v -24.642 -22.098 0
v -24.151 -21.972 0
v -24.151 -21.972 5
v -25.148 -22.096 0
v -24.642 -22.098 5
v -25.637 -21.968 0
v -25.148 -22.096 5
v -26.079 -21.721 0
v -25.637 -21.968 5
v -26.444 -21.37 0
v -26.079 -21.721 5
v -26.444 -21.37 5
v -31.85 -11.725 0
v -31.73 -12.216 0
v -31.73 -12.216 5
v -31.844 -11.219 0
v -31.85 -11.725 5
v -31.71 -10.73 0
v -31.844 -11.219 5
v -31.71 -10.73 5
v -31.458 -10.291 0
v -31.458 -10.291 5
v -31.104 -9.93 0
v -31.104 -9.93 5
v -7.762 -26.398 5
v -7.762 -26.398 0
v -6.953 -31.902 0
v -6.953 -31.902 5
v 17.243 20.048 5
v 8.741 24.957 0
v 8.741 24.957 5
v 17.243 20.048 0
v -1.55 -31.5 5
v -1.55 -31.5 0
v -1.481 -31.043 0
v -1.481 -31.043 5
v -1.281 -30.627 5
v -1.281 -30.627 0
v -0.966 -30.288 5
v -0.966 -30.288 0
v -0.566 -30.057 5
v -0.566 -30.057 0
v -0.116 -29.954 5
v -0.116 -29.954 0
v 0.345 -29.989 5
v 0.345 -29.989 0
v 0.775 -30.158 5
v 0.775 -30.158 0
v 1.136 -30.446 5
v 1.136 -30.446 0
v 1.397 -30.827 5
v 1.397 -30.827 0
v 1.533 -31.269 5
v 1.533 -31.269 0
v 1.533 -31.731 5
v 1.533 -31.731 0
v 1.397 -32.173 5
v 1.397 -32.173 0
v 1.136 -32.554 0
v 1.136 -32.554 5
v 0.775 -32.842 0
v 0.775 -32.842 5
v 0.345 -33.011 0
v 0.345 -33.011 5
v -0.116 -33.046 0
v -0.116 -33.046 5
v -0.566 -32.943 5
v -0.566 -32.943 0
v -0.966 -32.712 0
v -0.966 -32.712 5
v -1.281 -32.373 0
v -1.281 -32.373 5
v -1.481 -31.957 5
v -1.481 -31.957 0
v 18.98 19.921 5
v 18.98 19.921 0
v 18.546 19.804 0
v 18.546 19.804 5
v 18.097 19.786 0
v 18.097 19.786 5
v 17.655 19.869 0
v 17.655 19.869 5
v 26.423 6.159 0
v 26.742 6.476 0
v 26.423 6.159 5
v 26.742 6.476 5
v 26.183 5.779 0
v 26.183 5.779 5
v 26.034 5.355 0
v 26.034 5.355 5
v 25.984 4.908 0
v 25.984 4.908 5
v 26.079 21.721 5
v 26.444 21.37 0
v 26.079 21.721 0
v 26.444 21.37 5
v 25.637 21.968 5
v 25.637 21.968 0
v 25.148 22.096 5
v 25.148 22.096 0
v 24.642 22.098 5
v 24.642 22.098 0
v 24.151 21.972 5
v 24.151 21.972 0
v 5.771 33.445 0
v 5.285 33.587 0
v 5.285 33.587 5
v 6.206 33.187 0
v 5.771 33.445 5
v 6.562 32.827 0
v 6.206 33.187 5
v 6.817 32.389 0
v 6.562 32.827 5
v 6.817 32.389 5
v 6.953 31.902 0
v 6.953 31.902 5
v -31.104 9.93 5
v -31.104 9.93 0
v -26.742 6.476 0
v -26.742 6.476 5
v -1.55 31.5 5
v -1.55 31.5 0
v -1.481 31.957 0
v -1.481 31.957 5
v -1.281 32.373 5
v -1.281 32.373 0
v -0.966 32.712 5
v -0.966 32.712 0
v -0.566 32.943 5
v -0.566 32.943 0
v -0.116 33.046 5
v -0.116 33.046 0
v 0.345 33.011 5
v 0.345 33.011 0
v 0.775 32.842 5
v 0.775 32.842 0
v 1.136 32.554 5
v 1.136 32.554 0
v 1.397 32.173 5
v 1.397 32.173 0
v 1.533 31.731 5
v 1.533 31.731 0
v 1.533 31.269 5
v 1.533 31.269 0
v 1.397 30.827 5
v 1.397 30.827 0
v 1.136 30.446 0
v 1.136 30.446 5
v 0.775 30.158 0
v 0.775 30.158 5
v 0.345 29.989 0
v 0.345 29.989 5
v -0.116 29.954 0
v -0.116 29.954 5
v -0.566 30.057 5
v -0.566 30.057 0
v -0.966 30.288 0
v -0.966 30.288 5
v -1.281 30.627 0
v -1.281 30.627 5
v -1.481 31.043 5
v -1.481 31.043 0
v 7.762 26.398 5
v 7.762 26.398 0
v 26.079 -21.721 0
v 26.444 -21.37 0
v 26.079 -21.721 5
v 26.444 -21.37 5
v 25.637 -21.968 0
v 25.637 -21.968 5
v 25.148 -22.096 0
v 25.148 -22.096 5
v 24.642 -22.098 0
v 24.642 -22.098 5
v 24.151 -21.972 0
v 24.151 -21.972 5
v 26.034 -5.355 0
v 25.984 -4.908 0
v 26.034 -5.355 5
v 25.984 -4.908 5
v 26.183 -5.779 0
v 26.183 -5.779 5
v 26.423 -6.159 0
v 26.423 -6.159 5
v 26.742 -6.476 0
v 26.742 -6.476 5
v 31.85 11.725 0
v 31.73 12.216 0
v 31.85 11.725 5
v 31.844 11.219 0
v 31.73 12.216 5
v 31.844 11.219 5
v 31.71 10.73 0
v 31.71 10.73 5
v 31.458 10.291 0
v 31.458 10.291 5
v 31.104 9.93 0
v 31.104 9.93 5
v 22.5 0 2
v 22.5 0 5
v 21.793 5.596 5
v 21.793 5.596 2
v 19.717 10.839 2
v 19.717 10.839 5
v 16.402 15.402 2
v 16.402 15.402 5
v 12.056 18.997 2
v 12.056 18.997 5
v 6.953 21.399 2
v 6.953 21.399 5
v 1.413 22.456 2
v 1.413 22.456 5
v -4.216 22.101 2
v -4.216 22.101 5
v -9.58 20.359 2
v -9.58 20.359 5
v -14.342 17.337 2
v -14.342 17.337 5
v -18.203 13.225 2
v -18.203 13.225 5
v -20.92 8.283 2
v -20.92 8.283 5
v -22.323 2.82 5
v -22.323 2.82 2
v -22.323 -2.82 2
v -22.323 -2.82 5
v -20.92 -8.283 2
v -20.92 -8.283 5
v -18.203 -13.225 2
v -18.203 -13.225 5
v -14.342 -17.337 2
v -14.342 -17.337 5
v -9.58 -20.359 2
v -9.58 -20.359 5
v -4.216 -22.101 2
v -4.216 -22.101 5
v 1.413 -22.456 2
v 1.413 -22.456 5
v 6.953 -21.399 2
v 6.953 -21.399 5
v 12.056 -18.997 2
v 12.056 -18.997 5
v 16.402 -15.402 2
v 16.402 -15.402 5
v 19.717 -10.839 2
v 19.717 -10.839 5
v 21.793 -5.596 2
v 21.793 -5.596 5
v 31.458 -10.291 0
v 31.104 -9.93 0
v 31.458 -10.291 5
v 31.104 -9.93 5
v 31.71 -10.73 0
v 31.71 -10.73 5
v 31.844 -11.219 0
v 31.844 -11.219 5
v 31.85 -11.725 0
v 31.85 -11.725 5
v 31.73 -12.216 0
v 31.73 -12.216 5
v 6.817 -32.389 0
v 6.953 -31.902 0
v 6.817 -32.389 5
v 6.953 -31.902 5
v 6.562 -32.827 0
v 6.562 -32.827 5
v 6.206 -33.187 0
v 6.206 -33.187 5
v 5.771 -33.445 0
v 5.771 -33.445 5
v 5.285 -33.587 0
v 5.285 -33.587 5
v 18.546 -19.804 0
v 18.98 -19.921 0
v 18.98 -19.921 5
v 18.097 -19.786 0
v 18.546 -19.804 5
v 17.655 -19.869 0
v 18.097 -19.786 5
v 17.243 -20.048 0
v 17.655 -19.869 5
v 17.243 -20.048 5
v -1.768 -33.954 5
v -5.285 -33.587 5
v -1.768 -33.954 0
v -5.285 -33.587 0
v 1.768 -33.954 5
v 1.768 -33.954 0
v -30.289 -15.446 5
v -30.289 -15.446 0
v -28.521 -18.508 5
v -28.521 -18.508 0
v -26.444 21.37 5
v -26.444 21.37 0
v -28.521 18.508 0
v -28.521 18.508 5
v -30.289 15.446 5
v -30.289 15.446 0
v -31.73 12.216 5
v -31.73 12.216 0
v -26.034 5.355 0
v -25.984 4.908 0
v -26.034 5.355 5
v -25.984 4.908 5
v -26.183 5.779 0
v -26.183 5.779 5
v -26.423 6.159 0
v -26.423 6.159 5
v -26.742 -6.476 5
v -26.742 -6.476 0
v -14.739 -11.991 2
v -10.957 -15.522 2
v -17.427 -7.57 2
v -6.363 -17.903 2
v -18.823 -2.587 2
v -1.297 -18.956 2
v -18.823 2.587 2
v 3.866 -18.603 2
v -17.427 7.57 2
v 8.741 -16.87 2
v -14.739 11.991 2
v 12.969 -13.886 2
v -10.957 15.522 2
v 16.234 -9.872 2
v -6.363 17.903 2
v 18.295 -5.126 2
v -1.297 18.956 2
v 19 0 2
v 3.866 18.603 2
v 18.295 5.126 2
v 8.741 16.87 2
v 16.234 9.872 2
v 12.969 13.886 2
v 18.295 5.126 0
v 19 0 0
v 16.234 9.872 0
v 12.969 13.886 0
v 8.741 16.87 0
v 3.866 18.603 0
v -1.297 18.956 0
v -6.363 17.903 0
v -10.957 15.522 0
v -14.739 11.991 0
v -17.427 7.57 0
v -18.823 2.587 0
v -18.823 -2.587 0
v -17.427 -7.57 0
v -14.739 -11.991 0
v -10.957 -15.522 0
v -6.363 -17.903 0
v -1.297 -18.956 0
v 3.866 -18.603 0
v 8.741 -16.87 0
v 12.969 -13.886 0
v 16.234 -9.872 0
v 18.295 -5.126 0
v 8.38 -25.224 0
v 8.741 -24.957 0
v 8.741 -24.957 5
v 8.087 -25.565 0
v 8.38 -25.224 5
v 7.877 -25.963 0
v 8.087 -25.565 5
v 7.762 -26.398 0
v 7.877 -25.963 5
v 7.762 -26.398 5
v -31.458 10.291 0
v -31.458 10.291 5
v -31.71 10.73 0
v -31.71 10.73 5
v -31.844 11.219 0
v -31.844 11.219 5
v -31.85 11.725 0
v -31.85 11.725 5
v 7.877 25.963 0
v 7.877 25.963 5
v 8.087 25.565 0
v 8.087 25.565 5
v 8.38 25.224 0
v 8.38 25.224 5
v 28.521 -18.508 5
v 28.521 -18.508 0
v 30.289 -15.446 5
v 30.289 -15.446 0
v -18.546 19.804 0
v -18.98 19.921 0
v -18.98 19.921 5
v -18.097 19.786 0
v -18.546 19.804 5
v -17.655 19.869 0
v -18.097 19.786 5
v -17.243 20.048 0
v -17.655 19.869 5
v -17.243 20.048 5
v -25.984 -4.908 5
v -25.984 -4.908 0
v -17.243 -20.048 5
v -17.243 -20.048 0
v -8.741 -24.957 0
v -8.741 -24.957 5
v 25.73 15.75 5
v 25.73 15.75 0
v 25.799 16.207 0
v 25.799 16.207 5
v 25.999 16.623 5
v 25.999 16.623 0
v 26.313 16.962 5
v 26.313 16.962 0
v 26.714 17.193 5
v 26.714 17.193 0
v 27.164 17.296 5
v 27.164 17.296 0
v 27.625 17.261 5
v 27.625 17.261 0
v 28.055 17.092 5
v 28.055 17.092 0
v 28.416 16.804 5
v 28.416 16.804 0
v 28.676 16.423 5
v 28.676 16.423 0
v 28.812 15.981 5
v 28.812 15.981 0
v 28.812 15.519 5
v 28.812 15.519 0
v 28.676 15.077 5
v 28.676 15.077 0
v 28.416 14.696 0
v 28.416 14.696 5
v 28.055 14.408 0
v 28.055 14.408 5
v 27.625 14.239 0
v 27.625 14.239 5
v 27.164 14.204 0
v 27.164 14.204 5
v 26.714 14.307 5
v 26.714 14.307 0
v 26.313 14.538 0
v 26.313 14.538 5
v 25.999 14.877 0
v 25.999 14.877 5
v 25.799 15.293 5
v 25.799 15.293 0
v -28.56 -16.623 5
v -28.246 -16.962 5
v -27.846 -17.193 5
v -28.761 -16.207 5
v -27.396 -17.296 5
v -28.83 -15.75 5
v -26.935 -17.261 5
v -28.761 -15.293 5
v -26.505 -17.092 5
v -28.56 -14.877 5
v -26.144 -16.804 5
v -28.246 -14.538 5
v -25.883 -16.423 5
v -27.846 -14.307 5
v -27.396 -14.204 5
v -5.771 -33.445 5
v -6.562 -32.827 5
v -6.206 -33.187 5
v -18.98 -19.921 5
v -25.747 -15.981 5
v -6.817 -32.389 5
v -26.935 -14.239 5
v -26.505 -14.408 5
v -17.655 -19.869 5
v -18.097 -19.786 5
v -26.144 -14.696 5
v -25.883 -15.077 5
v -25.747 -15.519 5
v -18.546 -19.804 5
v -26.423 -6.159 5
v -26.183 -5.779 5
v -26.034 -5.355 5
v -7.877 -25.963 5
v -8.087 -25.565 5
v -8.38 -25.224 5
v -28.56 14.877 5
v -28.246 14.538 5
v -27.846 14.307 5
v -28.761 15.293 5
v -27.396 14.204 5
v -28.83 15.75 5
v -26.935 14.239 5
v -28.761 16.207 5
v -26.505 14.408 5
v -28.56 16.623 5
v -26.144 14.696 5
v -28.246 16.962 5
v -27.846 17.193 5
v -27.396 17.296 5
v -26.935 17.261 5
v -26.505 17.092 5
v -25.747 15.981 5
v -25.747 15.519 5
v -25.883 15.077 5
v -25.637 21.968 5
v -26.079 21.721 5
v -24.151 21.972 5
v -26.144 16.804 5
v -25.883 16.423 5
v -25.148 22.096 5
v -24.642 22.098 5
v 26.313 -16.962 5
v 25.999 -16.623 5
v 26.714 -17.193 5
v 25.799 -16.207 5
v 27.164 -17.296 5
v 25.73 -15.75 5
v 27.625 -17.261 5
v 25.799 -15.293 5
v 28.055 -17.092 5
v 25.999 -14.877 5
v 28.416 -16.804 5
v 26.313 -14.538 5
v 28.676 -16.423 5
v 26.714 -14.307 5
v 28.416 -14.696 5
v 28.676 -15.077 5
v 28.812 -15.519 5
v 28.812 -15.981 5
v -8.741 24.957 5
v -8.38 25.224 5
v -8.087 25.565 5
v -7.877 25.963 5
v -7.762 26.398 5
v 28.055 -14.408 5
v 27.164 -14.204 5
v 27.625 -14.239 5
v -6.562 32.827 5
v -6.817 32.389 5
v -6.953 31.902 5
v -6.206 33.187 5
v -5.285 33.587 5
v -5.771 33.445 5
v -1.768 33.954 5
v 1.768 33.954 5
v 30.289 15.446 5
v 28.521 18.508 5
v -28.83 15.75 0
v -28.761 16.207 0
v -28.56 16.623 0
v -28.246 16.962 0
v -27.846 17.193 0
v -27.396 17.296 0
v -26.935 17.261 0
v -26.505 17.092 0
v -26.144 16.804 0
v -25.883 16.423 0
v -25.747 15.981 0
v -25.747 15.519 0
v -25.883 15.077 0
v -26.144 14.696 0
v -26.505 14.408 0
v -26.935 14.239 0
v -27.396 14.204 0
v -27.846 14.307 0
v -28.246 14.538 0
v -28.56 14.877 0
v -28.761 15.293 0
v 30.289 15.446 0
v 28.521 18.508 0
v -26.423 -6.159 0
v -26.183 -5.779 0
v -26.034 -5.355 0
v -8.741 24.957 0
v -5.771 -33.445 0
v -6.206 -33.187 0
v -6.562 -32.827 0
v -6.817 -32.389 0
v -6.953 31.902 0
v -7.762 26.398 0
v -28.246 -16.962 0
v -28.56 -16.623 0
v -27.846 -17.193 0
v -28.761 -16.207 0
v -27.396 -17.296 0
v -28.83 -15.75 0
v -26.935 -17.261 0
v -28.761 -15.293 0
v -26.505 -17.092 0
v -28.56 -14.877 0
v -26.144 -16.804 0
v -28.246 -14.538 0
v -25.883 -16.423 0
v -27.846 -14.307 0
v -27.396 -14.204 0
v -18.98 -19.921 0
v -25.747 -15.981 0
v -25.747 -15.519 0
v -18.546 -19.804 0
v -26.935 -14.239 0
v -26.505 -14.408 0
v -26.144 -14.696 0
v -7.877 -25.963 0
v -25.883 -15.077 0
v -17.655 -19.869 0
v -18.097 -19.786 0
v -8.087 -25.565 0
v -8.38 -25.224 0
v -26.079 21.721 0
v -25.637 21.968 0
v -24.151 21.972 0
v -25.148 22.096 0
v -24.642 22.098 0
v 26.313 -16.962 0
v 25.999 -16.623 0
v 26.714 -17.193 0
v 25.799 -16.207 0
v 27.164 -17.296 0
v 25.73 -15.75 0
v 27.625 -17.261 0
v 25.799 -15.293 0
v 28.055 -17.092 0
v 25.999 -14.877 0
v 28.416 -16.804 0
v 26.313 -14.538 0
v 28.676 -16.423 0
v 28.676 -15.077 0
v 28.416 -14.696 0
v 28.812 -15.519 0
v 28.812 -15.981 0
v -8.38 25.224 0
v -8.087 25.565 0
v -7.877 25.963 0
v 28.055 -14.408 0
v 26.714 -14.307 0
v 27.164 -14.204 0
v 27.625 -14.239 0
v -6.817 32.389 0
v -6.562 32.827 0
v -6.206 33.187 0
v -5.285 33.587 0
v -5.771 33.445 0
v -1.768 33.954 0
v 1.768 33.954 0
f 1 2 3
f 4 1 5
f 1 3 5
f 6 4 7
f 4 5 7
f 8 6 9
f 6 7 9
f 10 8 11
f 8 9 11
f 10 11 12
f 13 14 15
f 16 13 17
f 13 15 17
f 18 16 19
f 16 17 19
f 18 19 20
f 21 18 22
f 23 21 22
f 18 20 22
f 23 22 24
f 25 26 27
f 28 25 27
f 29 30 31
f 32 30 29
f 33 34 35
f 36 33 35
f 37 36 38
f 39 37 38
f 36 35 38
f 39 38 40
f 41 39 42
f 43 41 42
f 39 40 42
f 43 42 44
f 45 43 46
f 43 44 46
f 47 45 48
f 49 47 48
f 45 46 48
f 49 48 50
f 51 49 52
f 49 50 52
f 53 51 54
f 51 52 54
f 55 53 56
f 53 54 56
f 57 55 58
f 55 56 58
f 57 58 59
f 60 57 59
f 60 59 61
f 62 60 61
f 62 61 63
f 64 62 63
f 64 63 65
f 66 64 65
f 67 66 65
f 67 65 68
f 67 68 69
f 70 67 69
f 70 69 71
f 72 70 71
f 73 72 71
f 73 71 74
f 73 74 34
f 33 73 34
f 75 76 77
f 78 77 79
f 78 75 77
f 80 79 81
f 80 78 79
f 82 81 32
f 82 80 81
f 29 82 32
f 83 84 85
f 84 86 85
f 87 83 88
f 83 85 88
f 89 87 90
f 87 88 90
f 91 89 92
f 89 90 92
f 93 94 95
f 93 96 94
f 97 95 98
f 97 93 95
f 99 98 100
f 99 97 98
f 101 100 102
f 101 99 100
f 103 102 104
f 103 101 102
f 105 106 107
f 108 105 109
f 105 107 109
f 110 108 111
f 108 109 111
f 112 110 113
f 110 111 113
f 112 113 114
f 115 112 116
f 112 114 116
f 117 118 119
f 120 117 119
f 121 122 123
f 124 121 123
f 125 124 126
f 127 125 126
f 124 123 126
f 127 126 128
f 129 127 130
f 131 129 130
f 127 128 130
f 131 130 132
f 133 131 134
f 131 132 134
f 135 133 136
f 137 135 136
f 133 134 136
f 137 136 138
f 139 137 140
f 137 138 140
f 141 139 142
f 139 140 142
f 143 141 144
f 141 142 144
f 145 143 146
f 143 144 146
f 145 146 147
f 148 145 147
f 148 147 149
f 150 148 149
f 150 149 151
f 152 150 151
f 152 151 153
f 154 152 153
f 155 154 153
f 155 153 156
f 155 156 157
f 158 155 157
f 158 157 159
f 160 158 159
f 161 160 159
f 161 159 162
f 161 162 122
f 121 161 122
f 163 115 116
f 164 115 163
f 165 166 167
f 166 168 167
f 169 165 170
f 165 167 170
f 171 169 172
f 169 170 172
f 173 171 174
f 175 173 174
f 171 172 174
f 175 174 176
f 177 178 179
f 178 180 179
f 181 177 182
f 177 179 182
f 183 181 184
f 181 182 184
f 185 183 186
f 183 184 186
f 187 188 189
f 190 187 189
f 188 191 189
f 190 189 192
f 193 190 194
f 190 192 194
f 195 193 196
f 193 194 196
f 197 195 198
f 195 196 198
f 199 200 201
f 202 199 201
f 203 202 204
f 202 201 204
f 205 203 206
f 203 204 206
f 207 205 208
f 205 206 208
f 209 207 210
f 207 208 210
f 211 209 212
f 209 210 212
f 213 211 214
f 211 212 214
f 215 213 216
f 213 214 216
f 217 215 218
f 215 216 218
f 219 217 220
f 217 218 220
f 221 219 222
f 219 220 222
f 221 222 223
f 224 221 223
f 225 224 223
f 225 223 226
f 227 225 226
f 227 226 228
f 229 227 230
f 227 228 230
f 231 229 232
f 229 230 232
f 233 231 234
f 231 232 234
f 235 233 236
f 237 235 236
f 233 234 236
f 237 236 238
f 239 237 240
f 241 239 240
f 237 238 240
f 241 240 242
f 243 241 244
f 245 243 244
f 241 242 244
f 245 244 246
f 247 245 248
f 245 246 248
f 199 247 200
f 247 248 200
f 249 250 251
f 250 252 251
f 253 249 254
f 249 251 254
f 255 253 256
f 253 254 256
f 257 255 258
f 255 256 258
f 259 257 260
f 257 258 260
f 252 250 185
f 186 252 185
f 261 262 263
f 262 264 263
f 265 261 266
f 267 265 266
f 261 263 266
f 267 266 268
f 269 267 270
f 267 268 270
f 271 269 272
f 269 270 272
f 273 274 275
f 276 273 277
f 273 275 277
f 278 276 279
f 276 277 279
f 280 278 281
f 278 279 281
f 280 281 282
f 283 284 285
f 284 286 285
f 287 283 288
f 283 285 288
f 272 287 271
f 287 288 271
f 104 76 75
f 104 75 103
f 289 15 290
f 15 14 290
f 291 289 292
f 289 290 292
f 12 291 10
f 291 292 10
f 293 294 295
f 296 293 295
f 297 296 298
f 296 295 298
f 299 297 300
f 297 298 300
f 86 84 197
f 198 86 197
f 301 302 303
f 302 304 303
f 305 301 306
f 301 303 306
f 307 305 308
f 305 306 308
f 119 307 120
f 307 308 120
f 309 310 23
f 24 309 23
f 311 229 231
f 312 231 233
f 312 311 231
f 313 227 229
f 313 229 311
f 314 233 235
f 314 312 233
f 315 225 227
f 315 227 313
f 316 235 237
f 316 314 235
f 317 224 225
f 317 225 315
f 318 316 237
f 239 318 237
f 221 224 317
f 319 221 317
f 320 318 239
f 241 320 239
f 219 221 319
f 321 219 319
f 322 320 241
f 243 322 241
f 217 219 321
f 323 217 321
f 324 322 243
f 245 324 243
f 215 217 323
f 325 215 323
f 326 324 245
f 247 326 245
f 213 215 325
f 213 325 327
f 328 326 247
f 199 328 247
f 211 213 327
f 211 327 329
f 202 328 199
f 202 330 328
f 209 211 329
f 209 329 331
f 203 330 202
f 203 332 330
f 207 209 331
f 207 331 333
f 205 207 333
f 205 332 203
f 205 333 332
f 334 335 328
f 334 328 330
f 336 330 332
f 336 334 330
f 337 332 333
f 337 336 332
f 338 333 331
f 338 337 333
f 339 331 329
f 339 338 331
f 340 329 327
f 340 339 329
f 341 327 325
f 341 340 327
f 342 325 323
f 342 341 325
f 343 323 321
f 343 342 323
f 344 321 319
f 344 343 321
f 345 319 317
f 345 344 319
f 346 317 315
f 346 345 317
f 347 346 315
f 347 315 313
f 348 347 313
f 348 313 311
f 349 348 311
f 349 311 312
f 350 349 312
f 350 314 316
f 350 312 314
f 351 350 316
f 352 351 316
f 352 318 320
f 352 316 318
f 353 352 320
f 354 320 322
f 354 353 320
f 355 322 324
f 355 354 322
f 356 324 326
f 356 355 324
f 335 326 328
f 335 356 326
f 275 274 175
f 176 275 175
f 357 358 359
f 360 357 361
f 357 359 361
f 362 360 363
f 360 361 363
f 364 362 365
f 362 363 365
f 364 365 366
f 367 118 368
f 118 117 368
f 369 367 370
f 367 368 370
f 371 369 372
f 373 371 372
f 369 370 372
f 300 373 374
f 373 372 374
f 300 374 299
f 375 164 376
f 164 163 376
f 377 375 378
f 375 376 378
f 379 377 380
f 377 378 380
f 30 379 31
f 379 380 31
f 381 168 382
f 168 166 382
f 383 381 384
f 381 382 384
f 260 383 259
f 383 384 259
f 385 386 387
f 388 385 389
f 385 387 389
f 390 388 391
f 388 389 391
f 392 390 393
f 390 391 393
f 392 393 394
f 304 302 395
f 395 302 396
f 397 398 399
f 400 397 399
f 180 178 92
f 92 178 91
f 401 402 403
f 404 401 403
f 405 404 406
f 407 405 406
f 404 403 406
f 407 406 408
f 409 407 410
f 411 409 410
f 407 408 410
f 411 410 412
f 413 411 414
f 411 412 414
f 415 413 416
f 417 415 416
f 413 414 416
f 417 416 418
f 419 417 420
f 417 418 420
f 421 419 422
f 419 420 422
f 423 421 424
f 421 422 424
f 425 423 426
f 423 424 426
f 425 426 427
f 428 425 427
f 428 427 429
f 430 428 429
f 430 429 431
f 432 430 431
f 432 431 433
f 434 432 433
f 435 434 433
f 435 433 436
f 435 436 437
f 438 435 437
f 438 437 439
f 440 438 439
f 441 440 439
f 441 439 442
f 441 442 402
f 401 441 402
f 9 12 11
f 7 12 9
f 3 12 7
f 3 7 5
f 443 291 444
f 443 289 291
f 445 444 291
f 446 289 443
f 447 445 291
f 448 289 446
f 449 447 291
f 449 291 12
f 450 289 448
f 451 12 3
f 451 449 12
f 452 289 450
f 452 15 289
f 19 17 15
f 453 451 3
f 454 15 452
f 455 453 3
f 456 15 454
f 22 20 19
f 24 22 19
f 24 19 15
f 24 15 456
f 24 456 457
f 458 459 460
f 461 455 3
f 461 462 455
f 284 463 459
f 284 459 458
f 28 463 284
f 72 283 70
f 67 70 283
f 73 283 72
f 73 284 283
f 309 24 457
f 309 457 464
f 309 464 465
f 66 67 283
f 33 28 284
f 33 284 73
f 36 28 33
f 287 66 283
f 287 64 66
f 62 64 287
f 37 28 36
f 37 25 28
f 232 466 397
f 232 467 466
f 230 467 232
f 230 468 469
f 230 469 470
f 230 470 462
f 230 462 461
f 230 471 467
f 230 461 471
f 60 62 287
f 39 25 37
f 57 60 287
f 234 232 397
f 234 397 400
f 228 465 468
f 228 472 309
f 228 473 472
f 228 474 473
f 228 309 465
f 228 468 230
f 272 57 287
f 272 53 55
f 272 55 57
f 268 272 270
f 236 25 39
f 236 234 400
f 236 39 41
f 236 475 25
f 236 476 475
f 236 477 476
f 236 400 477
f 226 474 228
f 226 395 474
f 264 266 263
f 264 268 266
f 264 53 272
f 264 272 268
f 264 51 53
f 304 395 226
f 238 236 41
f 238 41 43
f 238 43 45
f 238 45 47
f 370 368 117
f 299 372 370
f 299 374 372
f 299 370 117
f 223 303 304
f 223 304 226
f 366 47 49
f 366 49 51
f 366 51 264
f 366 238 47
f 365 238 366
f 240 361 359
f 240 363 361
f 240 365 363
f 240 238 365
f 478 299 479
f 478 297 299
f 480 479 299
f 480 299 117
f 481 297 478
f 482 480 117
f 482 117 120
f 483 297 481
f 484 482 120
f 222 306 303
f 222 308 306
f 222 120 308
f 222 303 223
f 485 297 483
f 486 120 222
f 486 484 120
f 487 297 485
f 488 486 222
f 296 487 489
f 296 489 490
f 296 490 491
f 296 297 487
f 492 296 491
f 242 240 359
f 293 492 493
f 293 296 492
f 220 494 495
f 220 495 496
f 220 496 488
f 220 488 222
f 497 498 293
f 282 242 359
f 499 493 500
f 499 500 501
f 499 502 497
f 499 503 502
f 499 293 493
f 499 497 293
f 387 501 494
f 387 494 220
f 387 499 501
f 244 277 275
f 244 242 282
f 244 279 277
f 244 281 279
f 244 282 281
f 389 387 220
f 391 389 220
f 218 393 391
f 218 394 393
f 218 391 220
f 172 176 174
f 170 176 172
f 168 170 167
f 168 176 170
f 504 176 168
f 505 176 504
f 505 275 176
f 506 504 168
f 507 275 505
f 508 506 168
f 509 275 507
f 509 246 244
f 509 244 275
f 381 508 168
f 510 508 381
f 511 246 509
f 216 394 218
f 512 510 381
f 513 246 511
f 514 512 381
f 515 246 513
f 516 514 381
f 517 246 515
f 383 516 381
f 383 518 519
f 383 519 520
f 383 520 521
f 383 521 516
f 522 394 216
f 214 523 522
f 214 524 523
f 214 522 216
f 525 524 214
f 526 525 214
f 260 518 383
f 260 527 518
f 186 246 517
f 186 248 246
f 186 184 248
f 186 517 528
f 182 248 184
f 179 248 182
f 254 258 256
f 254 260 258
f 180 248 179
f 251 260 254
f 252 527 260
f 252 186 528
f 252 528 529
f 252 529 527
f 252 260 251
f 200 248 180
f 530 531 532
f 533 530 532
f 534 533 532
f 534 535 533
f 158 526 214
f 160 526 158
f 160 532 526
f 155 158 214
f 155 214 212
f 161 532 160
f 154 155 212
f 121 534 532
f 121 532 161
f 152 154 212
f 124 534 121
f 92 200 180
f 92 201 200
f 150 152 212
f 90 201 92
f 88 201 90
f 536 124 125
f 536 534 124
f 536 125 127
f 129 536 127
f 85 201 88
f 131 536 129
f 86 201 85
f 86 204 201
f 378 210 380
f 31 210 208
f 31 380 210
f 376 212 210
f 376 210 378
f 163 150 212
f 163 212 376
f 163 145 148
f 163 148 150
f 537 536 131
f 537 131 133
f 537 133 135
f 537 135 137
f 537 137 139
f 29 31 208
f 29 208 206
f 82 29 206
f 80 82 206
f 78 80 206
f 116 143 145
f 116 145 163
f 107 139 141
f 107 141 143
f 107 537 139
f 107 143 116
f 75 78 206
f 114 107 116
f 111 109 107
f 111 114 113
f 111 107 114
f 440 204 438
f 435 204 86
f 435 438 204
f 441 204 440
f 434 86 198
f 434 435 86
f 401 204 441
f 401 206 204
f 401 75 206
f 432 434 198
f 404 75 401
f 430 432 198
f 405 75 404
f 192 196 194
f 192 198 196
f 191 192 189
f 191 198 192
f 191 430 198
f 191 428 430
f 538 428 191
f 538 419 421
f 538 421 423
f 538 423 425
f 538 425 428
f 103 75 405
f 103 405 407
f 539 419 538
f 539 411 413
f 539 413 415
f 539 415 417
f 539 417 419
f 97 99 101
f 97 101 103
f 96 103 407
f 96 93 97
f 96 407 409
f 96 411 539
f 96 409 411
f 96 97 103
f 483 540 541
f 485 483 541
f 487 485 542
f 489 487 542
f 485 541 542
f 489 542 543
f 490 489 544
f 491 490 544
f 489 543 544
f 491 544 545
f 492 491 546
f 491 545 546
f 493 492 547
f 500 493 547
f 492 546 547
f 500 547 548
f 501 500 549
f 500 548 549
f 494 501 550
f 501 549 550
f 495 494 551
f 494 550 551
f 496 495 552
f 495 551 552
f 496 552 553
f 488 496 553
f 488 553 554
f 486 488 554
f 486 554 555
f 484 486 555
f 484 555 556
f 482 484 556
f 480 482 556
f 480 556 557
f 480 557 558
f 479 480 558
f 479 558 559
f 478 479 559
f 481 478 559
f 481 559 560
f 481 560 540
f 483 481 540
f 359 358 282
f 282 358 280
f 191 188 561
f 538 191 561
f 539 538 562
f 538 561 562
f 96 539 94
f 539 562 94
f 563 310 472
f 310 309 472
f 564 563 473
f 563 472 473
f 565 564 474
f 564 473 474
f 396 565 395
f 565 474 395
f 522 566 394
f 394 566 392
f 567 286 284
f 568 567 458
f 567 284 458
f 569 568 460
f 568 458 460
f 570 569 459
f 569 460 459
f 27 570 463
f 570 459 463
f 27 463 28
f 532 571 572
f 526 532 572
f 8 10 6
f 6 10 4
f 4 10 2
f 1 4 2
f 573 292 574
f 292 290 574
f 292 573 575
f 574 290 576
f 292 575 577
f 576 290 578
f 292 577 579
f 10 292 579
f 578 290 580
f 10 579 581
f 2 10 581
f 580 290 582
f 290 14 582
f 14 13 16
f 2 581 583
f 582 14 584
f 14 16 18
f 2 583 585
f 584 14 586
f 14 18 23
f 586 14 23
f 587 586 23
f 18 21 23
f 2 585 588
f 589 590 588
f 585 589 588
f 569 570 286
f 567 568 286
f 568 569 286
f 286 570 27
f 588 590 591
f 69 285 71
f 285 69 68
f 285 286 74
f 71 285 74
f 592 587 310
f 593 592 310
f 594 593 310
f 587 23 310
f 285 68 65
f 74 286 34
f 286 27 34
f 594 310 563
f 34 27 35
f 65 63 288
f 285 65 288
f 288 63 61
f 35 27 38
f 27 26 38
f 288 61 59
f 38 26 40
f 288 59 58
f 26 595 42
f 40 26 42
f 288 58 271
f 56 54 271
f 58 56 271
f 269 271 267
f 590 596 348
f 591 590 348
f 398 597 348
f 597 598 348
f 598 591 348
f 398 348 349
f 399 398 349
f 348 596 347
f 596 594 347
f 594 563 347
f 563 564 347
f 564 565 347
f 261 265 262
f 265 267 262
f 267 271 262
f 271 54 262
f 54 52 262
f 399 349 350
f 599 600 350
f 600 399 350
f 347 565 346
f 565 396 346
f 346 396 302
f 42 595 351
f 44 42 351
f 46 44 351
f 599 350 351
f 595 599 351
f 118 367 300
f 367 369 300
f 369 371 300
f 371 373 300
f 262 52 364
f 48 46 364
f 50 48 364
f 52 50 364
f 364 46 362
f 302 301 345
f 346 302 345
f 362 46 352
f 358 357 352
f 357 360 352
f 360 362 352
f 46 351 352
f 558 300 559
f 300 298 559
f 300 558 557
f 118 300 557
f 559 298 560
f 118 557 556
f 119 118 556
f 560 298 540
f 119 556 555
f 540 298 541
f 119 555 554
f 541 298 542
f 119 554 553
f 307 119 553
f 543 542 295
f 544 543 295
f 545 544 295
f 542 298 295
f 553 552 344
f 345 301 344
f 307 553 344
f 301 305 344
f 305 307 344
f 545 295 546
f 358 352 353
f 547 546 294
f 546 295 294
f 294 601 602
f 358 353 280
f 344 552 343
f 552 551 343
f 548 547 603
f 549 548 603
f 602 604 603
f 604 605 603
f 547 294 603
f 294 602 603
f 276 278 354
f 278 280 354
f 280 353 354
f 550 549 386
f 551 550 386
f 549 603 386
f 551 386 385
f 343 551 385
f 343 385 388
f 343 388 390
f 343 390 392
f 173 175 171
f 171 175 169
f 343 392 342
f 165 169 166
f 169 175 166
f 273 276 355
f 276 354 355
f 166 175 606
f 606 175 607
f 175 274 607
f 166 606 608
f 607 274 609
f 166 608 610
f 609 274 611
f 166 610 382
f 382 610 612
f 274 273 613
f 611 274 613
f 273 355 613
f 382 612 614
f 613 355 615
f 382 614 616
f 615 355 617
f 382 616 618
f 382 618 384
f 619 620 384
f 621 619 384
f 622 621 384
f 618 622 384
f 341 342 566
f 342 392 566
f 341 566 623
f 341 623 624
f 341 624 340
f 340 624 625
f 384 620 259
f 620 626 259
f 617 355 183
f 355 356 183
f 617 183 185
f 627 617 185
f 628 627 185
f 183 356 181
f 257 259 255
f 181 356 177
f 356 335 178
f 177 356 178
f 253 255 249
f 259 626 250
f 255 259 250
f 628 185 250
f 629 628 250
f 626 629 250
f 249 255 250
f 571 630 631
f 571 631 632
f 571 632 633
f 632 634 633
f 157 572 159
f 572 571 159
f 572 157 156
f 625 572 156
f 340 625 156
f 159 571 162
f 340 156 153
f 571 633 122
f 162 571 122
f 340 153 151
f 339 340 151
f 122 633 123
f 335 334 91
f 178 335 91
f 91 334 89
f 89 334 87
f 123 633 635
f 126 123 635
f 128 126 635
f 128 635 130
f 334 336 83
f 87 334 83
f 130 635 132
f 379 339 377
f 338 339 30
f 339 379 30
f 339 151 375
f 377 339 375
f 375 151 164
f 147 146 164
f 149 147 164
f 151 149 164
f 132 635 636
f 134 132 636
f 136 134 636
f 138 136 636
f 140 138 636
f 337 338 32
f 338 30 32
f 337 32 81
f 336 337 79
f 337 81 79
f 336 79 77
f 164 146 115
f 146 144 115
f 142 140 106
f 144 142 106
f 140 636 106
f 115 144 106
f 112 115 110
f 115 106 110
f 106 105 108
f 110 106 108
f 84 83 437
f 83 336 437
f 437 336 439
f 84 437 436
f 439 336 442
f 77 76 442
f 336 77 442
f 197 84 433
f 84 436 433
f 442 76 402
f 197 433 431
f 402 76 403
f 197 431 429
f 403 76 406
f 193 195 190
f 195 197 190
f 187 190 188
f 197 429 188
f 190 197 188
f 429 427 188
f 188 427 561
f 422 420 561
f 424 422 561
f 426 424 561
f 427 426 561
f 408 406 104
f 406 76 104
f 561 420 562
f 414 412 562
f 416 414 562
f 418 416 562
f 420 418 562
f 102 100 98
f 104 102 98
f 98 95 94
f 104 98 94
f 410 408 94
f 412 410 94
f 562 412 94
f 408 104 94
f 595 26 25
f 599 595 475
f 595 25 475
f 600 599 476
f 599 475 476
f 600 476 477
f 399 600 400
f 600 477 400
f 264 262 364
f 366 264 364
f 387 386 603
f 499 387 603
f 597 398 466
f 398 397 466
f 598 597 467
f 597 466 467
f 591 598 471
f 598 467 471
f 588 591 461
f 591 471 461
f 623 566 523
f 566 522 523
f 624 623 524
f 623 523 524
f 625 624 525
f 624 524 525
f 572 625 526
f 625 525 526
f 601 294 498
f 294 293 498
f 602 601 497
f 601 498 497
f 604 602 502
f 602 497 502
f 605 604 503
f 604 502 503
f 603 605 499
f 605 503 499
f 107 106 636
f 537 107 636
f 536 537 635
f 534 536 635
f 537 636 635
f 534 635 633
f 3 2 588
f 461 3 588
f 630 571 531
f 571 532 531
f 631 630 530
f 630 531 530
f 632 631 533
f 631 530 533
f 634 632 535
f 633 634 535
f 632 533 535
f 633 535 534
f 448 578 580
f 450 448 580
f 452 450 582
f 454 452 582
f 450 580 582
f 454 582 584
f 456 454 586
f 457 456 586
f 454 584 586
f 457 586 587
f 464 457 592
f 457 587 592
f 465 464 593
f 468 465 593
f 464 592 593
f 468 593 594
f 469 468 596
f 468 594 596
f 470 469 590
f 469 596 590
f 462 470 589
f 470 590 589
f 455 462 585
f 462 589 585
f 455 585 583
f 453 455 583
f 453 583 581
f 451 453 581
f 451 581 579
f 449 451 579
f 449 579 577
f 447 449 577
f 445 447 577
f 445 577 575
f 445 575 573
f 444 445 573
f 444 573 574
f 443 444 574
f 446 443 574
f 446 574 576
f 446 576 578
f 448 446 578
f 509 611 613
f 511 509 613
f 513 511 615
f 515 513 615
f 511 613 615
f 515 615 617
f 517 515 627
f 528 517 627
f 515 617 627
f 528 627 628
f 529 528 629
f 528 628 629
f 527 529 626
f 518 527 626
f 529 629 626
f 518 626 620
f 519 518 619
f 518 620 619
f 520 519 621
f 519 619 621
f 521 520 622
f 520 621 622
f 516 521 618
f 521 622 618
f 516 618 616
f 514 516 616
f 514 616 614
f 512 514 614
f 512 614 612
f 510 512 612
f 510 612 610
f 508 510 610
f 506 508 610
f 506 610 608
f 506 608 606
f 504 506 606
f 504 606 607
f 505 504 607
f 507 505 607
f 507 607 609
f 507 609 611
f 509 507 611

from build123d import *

# Parameters (mm, degrees)
SKETCH_1_R          = 34
SKETCH_1_R_2        = 19
EXTRUDE_1_DEPTH     = 5
SKETCH_2_R          = 22.5
CUT_EXTRUDE_1_DEPTH = 3
SKETCH_3_R          = 1.55
CUT_EXTRUDE_2_DEPTH = 13
CUT_EXTRUDE_3_DEPTH = 13
FILLET_1_R          = 2


with BuildPart() as part:
    # 草图1 → 凸台-拉伸1 (new body)
    with BuildSketch(Plane.XY):
        Circle(SKETCH_1_R)
        Circle(SKETCH_1_R_2, mode=Mode.SUBTRACT)
    extrude(amount=EXTRUDE_1_DEPTH)

    # 草图2 → 切除-拉伸1 (cut)
    with BuildSketch(Plane.XY.offset(5)):
        Circle(SKETCH_2_R)
    extrude(amount=-CUT_EXTRUDE_1_DEPTH, mode=Mode.SUBTRACT)

    # 草图3 → 切除-拉伸2 (cut)
    with BuildSketch(Plane(origin=(0, 0, 0), x_dir=(-1, 0, 0), z_dir=(0, 0, -1))):
        with Locations((0, 31.5)):
            Circle(SKETCH_3_R)
        with Locations((27.279800219, 15.75)):
            Circle(SKETCH_3_R)
        with Locations((27.279800219, -15.75)):
            Circle(SKETCH_3_R)
        with Locations((0, -31.5)):
            Circle(SKETCH_3_R)
        with Locations((-27.279800219, -15.75)):
            Circle(SKETCH_3_R)
        with Locations((-27.279800219, 15.75)):
            Circle(SKETCH_3_R)
    extrude(amount=-CUT_EXTRUDE_2_DEPTH, mode=Mode.SUBTRACT)

    # 草图4 → 切除-拉伸3 (cut)
    with BuildSketch(Plane(origin=(0, 0, 0), x_dir=(-1, 0, 0), z_dir=(0, 0, -1))):
        with BuildLine():
            Line((-6.743785591, 33.324485831), (-7.903231695, 25.440443793))
            Line((-7.903231695, 25.440443793), (-18.080454761, 19.564621316))
            Line((-18.080454761, 19.564621316), (-25.487958502, 22.502532555))
            ThreePointArc((-25.487958502, 22.502532555), (-17, 29.444863729), (-6.743785591, 33.324485831))
        make_face()
        with BuildLine():
            Line((6.743785591, 33.324485831), (7.903231695, 25.440443793))
            Line((7.903231695, 25.440443793), (18.080454761, 19.564621316))
            Line((18.080454761, 19.564621316), (25.487958502, 22.502532555))
            ThreePointArc((25.487958502, 22.502532555), (17, 29.444863729), (6.743785591, 33.324485831))
        make_face()
        with BuildLine():
            Line((32.231744093, 10.821953276), (25.983686456, 5.875822477))
            Line((25.983686456, 5.875822477), (25.983686456, -5.875822477))
            Line((25.983686456, -5.875822477), (32.231744093, -10.821953276))
            ThreePointArc((32.231744093, -10.821953276), (34, 0), (32.231744093, 10.821953276))
        make_face()
        with BuildLine():
            Line((25.487958502, -22.502532555), (18.080454761, -19.564621316))
            Line((18.080454761, -19.564621316), (7.903231695, -25.440443793))
            Line((7.903231695, -25.440443793), (6.743785591, -33.324485831))
            ThreePointArc((6.743785591, -33.324485831), (17, -29.444863729), (25.487958502, -22.502532555))
        make_face()
        with BuildLine():
            Line((-6.743785591, -33.324485831), (-7.903231695, -25.440443793))
            Line((-7.903231695, -25.440443793), (-18.080454761, -19.564621316))
            Line((-18.080454761, -19.564621316), (-25.487958502, -22.502532555))
            ThreePointArc((-25.487958502, -22.502532555), (-17, -29.444863729), (-6.743785591, -33.324485831))
        make_face()
        with BuildLine():
            Line((-32.231744093, -10.821953276), (-25.983686456, -5.875822477))
            Line((-25.983686456, -5.875822477), (-25.983686456, 5.875822477))
            Line((-25.983686456, 5.875822477), (-32.231744093, 10.821953276))
            ThreePointArc((-32.231744093, 10.821953276), (-34, 0), (-32.231744093, -10.821953276))
        make_face()
    extrude(amount=-CUT_EXTRUDE_3_DEPTH, mode=Mode.SUBTRACT)

    # 圆角1
    fillet_1_edges = [part.edges().sort_by_distance(p)[0] for p in [
        (-25.983686456, -5.875822477, 2.5),
        (-25.983686456, 5.875822477, 2.5),
        (7.903231695, 25.440443793, 2.5),
        (18.080454761, 19.564621316, 2.5),
        (-18.080454761, 19.564621316, 2.5),
        (-7.903231695, 25.440443793, 2.5),
        (-6.743785591, 33.324485831, 2.5),
        (-25.487958502, 22.502532555, 2.5),
        (25.487958502, 22.502532555, 2.5),
        (6.743785591, 33.324485831, 2.5),
        (-32.231744093, 10.821953276, 2.5),
        (-32.231744093, -10.821953276, 2.5),
        (-25.487958502, -22.502532555, 2.5),
        (-6.743785591, -33.324485831, 2.5),
        (6.743785591, -33.324485831, 2.5),
        (25.487958502, -22.502532555, 2.5),
        (32.231744093, -10.821953276, 2.5),
        (32.231744093, 10.821953276, 2.5),
        (25.983686456, 5.875822477, 2.5),
        (25.983686456, -5.875822477, 2.5),
        (18.080454761, -19.564621316, 2.5),
        (7.903231695, -25.440443793, 2.5),
        (-7.903231695, -25.440443793, 2.5),
        (-18.080454761, -19.564621316, 2.5),
    ]]
    fillet(fillet_1_edges, radius=FILLET_1_R)


solid = part.part
